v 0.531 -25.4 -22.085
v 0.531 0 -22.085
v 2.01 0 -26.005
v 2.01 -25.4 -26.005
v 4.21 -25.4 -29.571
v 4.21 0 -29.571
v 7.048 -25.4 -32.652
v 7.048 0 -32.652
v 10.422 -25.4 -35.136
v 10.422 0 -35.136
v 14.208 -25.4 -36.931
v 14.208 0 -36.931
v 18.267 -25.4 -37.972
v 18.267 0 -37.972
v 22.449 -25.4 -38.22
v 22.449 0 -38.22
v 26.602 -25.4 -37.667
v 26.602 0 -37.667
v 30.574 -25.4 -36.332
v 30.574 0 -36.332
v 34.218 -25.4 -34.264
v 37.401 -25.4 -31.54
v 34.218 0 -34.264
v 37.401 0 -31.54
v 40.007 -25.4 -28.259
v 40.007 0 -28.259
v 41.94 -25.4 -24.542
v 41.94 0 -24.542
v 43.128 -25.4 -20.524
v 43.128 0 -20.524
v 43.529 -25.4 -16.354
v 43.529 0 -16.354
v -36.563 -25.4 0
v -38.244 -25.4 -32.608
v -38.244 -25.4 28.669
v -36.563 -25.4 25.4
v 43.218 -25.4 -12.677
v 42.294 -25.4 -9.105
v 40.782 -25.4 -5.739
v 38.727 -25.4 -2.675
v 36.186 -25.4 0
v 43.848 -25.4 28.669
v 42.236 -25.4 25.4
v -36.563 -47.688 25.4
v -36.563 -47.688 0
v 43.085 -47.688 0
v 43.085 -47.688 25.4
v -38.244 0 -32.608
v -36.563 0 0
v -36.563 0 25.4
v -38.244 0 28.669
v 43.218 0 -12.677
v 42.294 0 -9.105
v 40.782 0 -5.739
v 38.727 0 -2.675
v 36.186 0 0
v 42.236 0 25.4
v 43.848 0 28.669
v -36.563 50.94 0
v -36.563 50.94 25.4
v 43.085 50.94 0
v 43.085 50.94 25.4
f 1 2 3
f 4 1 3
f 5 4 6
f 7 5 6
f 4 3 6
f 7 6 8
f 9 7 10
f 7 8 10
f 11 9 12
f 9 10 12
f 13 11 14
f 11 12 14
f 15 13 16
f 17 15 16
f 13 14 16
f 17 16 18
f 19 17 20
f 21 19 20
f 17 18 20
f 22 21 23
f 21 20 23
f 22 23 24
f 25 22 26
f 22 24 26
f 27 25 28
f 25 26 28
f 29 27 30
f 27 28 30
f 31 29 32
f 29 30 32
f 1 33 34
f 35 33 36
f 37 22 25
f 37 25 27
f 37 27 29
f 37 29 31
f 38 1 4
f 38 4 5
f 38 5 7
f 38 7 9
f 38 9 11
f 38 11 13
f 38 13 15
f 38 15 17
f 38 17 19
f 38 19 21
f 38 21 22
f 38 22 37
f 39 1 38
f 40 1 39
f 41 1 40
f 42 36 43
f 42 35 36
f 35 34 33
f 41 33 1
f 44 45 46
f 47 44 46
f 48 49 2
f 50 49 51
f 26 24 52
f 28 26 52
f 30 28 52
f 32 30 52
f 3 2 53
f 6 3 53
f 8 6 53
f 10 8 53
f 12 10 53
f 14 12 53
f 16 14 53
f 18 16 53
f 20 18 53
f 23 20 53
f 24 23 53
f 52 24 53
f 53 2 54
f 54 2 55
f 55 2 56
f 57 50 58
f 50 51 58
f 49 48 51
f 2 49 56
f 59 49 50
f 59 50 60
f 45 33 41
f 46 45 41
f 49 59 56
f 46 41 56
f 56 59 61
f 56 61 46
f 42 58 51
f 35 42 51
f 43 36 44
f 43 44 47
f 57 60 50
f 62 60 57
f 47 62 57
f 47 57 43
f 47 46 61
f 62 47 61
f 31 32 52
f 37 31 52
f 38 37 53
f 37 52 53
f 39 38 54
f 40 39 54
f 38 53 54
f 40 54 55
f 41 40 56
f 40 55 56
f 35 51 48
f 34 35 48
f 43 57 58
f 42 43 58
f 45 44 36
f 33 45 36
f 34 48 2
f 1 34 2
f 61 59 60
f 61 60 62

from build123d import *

# Parameters (mm, degrees)
F1_W     = 79.647951
F1_H     = 98.628715
F2_DEPTH = 25.4
F3_DEPTH = 25.4


with BuildPart() as f2:
    # F1 (on Top) → F2 (new body)
    with BuildSketch(Plane.XY):
        with Locations((3.260706, 1.626015)):
            Rectangle(F1_W, F1_H)
    extrude(amount=F2_DEPTH)

    # F0 (on Front) → F3 (join)
    with BuildSketch(Plane.XZ):
        with BuildLine():
            Line((21.648072, -16.353669), (31.325075, 3.271477))
            ThreePointArc((31.325075, 3.271477), (7.739275, 0.538226), (0.530634, -22.084684))
            Line((0.530634, -22.084684), (21.648072, -16.353669))
        make_face()
        Polygon((43.848254, 28.668722), (-38.244482, 28.668722), (-38.244482, -32.607779), align=None)
        with BuildLine():
            Line((31.325075, 3.271477), (43.848254, 28.668722))
            Line((43.848254, 28.668722), (-38.244482, -32.607779))
            Line((-38.244482, -32.607779), (0.530634, -22.084684))
            ThreePointArc((0.530634, -22.084684), (7.739275, 0.538226), (31.325075, 3.271477))
        make_face()
        with BuildLine():
            ThreePointArc((43.529359, -16.353669), (40.22946, -4.798465), (31.325075, 3.271477))
            Line((31.325075, 3.271477), (21.648072, -16.353669))
            Line((21.648072, -16.353669), (0.530634, -22.084684))
            ThreePointArc((0.530634, -22.084684), (24.53892, -38.043153), (43.529359, -16.353669))
        make_face()
    extrude(amount=F3_DEPTH)


solid = f2.part
